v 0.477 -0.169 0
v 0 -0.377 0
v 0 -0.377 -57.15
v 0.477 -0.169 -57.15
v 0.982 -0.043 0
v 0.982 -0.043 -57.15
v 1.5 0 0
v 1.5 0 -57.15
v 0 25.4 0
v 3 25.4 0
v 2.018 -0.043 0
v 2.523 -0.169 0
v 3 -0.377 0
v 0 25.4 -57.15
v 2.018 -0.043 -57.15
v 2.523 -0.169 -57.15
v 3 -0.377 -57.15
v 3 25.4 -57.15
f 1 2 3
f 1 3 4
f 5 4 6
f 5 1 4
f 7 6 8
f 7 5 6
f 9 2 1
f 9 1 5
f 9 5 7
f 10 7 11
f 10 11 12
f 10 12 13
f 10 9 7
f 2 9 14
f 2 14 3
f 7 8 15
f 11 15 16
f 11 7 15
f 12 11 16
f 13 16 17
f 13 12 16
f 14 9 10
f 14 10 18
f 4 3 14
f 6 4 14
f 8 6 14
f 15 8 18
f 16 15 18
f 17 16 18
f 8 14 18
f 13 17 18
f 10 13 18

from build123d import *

# Parameters (mm, degrees)
CROQUIS1_W              = 57.15
CROQUIS1_H              = 25.4
SALIENTE_EXTRUIR1_DEPTH = 3
SALIENTE_EXTRUIR2_DEPTH = 57.15


with BuildPart() as part:
    # Croquis1 → Saliente-Extruir1 (new body)
    with BuildSketch(Plane(origin=(0, 0, 0), x_dir=(0, 0, -1), z_dir=(1, 0, 0))):
        with Locations((28.575, 12.7)):
            Rectangle(CROQUIS1_W, CROQUIS1_H)
    extrude(amount=SALIENTE_EXTRUIR1_DEPTH)

    # Croquis2 → Saliente-Extruir2 (add)
    with BuildSketch(Plane.XY):
        with BuildLine():
            Line((3, 0), (1.5, 0))
            ThreePointArc((1.5, 0), (2.273285807, -0.095608167), (3, -0.376674608))
            Line((3, -0.376674608), (3, 0))
        make_face()
        with BuildLine():
            Line((1.5, 0), (0, 0))
            Line((0, 0), (0, -0.376674608))
            ThreePointArc((0, -0.376674608), (0.726714193, -0.095608167), (1.5, 0))
        make_face()
    extrude(amount=-SALIENTE_EXTRUIR2_DEPTH)


solid = part.part
